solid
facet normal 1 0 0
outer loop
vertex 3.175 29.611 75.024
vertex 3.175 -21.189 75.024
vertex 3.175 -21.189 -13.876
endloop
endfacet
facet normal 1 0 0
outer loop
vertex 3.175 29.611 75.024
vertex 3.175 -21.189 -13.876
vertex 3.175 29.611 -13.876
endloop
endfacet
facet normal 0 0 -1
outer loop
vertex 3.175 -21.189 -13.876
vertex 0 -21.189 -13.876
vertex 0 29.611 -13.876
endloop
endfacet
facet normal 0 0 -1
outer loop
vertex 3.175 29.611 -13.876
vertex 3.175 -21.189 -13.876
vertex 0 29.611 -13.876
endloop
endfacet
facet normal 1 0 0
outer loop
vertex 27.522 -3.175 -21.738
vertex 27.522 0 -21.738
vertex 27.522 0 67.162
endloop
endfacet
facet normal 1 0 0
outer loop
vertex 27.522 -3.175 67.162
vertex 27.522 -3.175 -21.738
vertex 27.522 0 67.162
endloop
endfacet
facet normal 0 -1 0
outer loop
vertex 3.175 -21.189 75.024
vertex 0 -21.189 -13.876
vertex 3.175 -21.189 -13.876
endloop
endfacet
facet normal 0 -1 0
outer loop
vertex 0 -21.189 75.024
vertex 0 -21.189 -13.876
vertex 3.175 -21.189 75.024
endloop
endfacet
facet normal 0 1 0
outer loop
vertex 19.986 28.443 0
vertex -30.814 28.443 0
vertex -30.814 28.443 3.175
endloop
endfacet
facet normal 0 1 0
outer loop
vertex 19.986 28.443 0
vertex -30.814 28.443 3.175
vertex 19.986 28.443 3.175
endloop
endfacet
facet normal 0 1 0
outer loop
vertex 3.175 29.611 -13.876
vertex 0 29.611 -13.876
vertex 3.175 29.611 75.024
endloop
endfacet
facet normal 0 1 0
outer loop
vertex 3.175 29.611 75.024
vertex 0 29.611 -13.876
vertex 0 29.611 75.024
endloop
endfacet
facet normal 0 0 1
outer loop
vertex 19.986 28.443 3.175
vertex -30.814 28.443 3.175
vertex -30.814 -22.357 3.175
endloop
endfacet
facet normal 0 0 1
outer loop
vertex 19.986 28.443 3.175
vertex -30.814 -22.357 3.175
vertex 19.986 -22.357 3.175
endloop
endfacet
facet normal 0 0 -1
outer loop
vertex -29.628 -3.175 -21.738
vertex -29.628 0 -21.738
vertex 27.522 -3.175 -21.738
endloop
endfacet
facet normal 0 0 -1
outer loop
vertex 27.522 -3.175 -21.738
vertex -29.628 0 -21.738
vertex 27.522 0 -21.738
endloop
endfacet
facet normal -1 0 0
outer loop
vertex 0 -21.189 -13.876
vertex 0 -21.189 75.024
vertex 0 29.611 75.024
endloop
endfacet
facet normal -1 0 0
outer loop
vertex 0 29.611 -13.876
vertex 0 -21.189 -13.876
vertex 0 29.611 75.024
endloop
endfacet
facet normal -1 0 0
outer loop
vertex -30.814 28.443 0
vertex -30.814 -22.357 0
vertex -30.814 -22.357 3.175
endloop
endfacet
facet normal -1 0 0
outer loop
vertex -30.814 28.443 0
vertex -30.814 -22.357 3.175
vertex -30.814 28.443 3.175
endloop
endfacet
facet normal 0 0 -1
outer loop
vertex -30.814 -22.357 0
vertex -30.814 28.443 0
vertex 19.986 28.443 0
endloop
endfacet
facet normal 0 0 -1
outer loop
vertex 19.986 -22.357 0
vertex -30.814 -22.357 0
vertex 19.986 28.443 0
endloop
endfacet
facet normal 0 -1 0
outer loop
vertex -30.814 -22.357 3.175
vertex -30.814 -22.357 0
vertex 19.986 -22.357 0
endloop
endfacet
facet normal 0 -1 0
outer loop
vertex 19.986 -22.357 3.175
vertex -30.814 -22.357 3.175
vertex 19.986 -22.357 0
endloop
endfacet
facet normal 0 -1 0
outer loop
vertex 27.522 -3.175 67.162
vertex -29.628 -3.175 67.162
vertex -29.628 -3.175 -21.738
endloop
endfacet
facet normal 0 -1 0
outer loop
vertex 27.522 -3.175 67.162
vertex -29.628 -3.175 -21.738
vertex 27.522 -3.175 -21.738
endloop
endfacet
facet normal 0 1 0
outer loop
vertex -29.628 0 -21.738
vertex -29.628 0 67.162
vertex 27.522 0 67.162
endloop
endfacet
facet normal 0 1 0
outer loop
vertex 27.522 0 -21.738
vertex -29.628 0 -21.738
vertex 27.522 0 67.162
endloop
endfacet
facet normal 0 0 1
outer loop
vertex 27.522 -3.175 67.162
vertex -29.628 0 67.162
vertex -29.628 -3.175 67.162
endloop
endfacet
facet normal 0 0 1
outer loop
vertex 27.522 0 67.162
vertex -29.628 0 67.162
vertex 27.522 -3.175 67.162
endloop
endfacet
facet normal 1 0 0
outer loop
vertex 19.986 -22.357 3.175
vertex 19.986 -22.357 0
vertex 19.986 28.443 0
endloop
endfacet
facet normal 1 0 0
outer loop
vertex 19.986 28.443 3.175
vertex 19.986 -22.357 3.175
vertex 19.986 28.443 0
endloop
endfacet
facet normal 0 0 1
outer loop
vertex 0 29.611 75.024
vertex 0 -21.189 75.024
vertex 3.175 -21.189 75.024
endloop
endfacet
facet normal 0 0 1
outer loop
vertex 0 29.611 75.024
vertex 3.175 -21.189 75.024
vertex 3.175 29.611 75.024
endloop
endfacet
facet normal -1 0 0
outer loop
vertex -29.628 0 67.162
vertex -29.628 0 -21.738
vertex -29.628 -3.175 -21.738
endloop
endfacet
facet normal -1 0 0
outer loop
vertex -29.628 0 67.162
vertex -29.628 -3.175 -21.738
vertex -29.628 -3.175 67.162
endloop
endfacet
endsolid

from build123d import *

# Parameters (mm, degrees)
F0_W     = 57.15
F0_H     = 88.9
F1_DEPTH = 3.175
F2_W     = 50.8
F2_H     = 88.9
F3_DEPTH = 3.175
F4_W     = 50.8
F4_H     = 50.8
F5_DEPTH = 3.175


with BuildPart() as f1:
    # F0 (on Front) → F1 (new body)
    with BuildSketch(Plane.XZ):
        with Locations((-1.052763, 22.712028)):
            Rectangle(F0_W, F0_H)
    extrude(amount=F1_DEPTH)


with BuildPart() as f3:
    # F2 (on Right) → F3 (new body)
    with BuildSketch(Plane.YZ):
        with Locations((4.211053, 30.57358)):
            Rectangle(F2_W, F2_H)
    extrude(amount=F3_DEPTH)


with BuildPart() as f5:
    # F4 (on Top) → F5 (new body)
    with BuildSketch(Plane.XY):
        with Locations((-5.41421, 3.042601)):
            Rectangle(F4_W, F4_H)
    extrude(amount=F5_DEPTH)


solid = Compound([f1.part, f3.part, f5.part])
